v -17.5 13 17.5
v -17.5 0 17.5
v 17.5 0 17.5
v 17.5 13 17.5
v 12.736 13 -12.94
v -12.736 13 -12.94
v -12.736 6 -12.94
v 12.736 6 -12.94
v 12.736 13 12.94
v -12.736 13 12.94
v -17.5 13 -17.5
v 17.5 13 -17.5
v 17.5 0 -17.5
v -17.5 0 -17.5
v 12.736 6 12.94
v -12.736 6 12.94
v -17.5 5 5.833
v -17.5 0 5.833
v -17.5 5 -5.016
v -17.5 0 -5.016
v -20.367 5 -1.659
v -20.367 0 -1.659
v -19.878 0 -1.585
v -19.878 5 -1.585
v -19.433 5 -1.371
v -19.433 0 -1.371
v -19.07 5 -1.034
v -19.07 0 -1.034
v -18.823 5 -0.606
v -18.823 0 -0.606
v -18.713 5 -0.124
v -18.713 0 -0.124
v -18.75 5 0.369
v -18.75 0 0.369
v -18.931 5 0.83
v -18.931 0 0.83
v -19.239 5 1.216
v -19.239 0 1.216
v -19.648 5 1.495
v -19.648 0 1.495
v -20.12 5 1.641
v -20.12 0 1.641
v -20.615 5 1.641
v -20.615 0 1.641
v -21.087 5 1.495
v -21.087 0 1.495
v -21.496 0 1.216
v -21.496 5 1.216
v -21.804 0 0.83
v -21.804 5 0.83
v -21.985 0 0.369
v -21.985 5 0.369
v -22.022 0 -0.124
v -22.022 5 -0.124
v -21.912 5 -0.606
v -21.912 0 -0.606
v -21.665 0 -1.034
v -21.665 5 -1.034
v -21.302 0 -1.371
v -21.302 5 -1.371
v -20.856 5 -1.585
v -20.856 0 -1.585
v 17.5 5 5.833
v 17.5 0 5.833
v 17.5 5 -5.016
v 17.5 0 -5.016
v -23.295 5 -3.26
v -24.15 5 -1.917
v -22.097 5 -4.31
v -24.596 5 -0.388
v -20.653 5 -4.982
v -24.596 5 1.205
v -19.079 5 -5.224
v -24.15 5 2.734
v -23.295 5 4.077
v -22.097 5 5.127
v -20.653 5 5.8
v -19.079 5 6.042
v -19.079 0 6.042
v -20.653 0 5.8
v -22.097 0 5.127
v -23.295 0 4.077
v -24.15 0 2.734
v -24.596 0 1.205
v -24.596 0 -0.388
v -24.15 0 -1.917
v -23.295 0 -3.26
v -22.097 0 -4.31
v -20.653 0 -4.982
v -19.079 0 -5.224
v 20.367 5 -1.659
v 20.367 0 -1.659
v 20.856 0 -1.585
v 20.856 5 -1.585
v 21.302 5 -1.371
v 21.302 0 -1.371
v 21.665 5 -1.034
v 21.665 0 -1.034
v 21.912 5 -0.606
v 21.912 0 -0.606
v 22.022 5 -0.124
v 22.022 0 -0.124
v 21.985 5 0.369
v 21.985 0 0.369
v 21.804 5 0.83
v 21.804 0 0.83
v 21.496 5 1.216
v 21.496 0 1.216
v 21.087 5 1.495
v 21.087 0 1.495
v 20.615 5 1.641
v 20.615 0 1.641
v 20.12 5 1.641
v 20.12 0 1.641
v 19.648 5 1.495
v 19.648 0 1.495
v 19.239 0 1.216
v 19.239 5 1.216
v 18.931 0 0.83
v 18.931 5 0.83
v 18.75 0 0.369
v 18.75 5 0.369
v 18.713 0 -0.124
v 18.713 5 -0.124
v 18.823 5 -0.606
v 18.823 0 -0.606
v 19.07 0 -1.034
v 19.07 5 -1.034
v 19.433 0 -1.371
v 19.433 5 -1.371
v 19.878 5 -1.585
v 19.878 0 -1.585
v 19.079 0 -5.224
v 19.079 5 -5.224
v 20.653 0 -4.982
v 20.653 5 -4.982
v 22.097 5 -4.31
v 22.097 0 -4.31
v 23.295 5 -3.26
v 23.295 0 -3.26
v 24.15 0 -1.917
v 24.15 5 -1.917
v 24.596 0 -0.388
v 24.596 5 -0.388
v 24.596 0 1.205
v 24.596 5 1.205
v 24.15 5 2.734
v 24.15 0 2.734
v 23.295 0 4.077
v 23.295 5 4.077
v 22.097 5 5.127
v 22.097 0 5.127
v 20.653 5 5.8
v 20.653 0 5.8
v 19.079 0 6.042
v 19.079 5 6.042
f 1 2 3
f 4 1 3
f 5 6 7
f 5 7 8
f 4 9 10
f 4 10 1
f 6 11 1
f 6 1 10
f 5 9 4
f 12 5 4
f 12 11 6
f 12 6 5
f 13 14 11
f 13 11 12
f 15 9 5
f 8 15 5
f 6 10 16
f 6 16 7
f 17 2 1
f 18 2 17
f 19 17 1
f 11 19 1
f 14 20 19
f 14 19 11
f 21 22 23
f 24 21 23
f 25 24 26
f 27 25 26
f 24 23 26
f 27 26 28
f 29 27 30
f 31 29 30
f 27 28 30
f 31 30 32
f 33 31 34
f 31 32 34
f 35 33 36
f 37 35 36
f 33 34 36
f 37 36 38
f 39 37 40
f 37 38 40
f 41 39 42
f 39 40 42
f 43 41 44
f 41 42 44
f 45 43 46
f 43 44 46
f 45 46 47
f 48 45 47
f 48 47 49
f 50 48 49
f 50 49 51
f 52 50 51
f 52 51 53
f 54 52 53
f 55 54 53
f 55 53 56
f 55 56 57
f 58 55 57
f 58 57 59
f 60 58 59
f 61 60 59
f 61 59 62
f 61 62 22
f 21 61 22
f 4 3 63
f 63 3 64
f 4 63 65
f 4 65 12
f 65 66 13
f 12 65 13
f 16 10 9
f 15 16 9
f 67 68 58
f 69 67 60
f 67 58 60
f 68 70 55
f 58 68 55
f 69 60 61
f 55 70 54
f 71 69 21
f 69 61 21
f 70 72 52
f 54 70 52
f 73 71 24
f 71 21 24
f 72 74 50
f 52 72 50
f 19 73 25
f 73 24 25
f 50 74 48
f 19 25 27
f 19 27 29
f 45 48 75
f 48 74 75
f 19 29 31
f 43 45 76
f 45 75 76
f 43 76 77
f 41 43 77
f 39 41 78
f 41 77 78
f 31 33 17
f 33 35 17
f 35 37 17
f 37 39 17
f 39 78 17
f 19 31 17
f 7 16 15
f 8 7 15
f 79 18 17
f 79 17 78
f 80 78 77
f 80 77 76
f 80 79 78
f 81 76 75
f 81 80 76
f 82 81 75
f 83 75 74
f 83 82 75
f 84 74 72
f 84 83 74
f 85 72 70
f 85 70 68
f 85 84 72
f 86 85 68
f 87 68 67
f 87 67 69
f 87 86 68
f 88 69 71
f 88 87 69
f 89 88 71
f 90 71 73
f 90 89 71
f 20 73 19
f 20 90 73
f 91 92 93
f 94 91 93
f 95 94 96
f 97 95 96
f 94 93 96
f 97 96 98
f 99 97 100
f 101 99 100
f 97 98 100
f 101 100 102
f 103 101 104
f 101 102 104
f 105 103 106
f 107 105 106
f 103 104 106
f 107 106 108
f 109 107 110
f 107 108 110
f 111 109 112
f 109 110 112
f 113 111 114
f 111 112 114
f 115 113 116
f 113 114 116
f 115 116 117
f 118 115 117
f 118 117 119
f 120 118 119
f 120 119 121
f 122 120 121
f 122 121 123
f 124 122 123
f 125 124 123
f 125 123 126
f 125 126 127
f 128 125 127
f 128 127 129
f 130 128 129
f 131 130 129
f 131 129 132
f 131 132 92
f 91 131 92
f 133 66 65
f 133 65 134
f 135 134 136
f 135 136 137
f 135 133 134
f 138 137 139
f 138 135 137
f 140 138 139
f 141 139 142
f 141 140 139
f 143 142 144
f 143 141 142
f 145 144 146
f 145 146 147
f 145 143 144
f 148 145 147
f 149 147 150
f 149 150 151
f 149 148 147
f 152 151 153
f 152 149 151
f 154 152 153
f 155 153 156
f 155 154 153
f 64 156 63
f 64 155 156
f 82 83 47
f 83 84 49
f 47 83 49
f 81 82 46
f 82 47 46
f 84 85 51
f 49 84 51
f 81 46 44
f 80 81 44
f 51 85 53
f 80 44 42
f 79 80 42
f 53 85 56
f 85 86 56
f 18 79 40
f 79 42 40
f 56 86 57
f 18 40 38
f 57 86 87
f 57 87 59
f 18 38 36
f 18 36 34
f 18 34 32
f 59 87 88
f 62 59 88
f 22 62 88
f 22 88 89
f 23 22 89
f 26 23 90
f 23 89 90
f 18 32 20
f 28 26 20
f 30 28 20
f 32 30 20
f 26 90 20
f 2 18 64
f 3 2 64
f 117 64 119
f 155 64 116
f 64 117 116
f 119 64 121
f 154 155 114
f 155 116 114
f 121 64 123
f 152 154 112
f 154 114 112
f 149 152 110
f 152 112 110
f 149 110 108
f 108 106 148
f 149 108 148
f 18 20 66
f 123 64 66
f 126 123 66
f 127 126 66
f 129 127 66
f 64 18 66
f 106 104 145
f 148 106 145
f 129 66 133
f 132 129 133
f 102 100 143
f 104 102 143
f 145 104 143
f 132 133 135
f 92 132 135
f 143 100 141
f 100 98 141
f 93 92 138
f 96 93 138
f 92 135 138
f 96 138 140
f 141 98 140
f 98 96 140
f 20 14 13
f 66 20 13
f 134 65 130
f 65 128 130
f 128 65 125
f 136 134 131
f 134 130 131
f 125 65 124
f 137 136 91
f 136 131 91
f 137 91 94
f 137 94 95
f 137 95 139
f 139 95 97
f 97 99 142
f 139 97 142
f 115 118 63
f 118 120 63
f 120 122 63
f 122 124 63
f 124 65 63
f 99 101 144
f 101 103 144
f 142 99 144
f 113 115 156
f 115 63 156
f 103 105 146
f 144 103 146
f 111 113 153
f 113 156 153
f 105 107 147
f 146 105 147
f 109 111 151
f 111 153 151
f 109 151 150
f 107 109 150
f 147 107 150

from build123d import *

# Parameters (mm, degrees)
SKETCH1_W           = 35
SKETCH1_H           = 35
BOSS_EXTRUDE1_DEPTH = 13
SKETCH2_W           = 25.47118856
SKETCH2_H           = 25.879985414
CUT_EXTRUDE1_DEPTH  = 7
BOSS_EXTRUDE2_DEPTH = 5
SKETCH5_R           = 1.659140746
CUT_EXTRUDE2_DEPTH  = 33.909124542


with BuildPart() as part:
    # Sketch1 → Boss-Extrude1 (new body)
    with BuildSketch(Plane(origin=(0, 0, 0), x_dir=(1, 0, 0), z_dir=(0, 1, 0))):
        Rectangle(SKETCH1_W, SKETCH1_H)
    extrude(amount=BOSS_EXTRUDE1_DEPTH)

    # Sketch2 → Cut-Extrude1 (cut)
    with BuildSketch(Plane(origin=(0, 13, 0), x_dir=(1, 0, 0), z_dir=(0, 1, 0))):
        Rectangle(SKETCH2_W, SKETCH2_H)
    extrude(amount=-CUT_EXTRUDE1_DEPTH, mode=Mode.SUBTRACT)

    # Sketch3 → Boss-Extrude2 (add)
    with BuildSketch(Plane.XZ):
        with BuildLine():
            Line((-17.5, -5.015622933), (-17.5, 5.83321664))
            ThreePointArc((-17.5, 5.83321664), (-24.652798585, 0.408796853), (-17.5, -5.015622933))
        make_face()
        with BuildLine():
            ThreePointArc((17.5, -5.015622933), (24.652798585, 0.408796853), (17.5, 5.83321664))
            Line((17.5, 5.83321664), (17.5, -5.015622933))
        make_face()
    extrude(amount=-BOSS_EXTRUDE2_DEPTH)

    # Sketch5 → Cut-Extrude2 (cut, through all)
    with BuildSketch(Plane.XZ):
        with Locations(Location((-20.367399271, 0, 0), (0, 0, 270))):
            Circle(SKETCH5_R)
        with Locations(Location((20.367399271, 0, 0), (0, 0, 270))):
            Circle(SKETCH5_R)
    extrude(amount=-CUT_EXTRUDE2_DEPTH, mode=Mode.SUBTRACT)


solid = part.part
